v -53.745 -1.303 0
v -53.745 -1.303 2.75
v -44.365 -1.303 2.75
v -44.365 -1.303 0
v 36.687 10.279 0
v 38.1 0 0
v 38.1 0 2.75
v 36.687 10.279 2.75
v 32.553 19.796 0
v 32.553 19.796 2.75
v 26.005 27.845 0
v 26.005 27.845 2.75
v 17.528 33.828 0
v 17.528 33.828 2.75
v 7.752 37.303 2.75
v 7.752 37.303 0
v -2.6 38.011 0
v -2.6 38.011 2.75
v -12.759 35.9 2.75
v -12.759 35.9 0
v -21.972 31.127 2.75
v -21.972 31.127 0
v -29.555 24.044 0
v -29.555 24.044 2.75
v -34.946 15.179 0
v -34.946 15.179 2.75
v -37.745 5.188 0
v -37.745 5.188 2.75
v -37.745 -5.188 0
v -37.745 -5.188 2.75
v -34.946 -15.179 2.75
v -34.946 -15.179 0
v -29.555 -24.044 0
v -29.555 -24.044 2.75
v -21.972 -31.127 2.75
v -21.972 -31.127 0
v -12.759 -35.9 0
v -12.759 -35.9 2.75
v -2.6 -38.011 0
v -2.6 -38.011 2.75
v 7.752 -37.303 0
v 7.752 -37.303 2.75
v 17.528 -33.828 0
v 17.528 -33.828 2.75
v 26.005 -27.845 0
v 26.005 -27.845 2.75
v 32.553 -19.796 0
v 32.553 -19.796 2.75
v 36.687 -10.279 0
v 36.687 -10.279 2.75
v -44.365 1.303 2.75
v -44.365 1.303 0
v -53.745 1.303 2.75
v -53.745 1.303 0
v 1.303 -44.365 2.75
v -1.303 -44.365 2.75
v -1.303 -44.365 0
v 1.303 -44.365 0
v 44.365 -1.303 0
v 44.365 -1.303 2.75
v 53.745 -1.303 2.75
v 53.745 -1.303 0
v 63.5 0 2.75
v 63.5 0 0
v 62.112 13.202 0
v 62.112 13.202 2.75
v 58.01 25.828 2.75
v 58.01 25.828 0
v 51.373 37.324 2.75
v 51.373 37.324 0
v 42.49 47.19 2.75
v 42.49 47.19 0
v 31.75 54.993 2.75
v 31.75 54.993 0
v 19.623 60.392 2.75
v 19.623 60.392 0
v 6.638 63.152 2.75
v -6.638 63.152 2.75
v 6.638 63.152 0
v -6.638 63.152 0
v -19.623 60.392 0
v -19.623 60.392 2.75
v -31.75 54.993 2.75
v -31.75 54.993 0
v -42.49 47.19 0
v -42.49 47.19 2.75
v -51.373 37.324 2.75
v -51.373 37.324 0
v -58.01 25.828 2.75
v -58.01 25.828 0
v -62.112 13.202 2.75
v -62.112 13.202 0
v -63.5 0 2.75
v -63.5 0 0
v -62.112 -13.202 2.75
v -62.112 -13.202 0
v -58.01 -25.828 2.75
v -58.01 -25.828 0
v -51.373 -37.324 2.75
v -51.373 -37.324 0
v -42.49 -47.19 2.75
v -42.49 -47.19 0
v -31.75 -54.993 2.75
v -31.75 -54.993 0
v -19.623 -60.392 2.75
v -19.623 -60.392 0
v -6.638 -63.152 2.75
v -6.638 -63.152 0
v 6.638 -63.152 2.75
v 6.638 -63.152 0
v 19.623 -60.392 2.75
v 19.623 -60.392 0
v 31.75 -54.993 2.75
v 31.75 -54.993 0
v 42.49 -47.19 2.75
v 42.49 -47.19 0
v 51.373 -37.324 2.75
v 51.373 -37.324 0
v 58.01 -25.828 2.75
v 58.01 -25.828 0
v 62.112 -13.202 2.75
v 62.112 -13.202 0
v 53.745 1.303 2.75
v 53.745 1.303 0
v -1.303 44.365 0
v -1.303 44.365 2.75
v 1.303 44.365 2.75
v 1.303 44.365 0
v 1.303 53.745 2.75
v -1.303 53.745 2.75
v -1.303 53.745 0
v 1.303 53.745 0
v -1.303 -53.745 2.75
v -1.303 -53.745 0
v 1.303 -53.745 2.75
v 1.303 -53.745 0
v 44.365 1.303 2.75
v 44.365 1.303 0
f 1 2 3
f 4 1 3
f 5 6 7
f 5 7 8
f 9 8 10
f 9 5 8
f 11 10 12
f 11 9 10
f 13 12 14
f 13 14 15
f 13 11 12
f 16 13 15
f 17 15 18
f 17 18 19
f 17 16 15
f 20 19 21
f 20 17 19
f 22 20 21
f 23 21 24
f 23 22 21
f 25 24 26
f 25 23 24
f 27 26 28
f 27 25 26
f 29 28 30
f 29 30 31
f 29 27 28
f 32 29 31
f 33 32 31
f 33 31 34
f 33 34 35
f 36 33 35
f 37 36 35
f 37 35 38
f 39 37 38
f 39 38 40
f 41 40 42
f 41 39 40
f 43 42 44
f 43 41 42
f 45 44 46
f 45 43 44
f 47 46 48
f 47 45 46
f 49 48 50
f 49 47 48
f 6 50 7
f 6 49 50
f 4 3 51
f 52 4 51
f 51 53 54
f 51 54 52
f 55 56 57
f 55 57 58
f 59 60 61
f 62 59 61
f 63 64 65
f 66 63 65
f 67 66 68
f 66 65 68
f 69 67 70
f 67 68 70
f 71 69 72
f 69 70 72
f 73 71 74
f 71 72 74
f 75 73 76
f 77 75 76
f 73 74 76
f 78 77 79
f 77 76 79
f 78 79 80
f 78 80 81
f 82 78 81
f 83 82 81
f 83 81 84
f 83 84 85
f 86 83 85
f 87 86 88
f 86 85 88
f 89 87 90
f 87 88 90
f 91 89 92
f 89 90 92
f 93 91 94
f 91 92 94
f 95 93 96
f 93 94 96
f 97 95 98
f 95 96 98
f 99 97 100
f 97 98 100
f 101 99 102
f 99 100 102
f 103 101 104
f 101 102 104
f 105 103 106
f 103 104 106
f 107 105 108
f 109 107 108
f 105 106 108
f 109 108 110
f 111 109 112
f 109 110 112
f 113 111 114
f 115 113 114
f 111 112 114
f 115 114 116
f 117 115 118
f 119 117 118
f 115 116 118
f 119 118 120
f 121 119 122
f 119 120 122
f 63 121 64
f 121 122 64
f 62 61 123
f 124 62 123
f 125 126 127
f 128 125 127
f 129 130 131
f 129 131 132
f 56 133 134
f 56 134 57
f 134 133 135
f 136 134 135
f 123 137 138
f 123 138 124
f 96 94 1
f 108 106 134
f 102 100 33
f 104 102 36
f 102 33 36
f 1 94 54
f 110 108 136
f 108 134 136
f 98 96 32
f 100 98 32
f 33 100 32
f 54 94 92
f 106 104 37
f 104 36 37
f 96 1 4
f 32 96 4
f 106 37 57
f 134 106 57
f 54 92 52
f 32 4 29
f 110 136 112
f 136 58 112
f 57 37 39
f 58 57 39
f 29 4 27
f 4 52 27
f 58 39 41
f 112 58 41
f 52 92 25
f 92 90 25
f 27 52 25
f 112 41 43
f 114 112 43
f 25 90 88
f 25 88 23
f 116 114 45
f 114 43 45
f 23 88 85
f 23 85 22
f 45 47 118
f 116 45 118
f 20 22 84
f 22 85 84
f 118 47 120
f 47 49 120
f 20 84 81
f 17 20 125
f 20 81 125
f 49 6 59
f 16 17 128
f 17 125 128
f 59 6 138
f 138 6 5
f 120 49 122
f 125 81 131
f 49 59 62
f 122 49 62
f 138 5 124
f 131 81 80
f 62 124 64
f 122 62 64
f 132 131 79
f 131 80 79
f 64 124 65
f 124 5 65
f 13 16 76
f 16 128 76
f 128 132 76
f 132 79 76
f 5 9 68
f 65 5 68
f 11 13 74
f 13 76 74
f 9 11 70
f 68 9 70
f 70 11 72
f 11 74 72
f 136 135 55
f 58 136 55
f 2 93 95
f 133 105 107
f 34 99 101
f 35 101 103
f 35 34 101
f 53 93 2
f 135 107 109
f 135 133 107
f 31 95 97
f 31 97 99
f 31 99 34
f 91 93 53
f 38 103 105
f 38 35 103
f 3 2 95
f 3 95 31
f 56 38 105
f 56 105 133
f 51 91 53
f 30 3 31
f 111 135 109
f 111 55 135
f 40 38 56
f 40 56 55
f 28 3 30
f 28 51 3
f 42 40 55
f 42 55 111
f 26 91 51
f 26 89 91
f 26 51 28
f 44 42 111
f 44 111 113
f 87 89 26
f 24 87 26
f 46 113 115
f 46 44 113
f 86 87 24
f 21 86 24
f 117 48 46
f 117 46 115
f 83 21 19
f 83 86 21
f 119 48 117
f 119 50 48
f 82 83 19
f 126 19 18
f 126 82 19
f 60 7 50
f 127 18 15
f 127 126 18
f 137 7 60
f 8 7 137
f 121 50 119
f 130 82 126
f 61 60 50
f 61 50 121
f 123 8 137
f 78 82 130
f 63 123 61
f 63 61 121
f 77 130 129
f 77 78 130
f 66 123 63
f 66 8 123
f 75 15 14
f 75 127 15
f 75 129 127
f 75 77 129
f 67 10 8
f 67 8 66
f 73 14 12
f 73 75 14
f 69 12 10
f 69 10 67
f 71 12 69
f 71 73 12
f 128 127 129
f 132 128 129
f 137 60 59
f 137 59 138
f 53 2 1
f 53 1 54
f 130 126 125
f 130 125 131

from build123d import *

# Parameters (mm, degrees)
SKETCH1_R           = 63.5
SKETCH1_R_2         = 38.1
BOSS_EXTRUDE1_DEPTH = 2.750000088
SKETCH2_W           = 9.380000036
SKETCH2_H           = 2.605000124
SKETCH2_W_2         = 2.605000124
SKETCH2_H_2         = 9.380000036
CUT_EXTRUDE1_DEPTH  = 90.844657607


with BuildPart() as part:
    # Sketch1 → Boss-Extrude1 (new body)
    with BuildSketch(Plane(origin=(0, 0, 0), x_dir=(0, 1, 0), z_dir=(0, 0, 1))):
        with Locations(Location((0, 0, 0), (0, 0, 270))):
            Circle(SKETCH1_R)
        with Locations(Location((0, 0, 0), (0, 0, 270))):
            Circle(SKETCH1_R_2, mode=Mode.SUBTRACT)
    extrude(amount=BOSS_EXTRUDE1_DEPTH)

    # Sketch2 → Cut-Extrude1 (cut, through all)
    with BuildSketch(Plane.XY.offset(2.750000088)):
        with Locations((49.055203892, 0)):
            Rectangle(SKETCH2_W, SKETCH2_H)
        with Locations((0, 49.055203892)):
            Rectangle(SKETCH2_W_2, SKETCH2_H_2)
        with Locations((0, -49.055203892)):
            Rectangle(SKETCH2_W_2, SKETCH2_H_2)
        with Locations((-49.055203892, 0)):
            Rectangle(SKETCH2_W, SKETCH2_H)
    extrude(amount=-CUT_EXTRUDE1_DEPTH, mode=Mode.SUBTRACT)


solid = part.part
